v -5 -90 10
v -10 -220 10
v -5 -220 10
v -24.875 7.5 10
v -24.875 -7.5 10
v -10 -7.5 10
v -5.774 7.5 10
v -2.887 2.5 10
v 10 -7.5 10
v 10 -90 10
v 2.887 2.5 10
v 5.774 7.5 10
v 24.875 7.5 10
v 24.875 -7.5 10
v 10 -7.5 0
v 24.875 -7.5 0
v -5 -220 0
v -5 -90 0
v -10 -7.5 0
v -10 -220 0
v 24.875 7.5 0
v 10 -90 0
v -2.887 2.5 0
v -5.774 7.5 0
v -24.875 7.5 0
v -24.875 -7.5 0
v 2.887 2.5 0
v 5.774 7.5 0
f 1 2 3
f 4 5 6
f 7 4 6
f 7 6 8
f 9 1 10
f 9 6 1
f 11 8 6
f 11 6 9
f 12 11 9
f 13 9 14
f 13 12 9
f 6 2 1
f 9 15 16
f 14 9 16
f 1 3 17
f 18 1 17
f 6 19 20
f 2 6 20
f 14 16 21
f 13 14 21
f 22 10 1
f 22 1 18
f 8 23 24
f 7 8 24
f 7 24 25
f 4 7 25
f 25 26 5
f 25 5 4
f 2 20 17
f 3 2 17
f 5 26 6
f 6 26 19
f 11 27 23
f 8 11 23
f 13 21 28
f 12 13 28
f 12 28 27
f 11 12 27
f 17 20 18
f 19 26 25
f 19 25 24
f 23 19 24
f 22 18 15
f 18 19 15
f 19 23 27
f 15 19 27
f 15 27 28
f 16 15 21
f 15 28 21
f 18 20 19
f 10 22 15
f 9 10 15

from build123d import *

# Parameters (mm, degrees)
SKETCH1_W             = 20
SKETCH1_H             = 197.5
SKETCH1_H_2           = 15
SKETCH1_W_2           = 14.875
BOSS_EXTRUDE1_DEPTH   = 10
IZIM1_W               = 10
IZIM1_H               = 130
KES_EKSTR_ZYON1_DEPTH = 15


with BuildPart() as part:
    # Sketch1 → Boss-Extrude1 (new body)
    with BuildSketch(Plane.XY):
        with Locations((0, -121.25)):
            Rectangle(SKETCH1_W, SKETCH1_H)
        with Locations((0, -15)):
            Rectangle(SKETCH1_W, SKETCH1_H_2)
        Polygon((-10, 7.5), (-10, -7.5), (10, -7.5), (10, 7.5), (5.773502692, 7.5), (2.886751346, 2.5), (-2.886751346, 2.5), (-5.773502692, 7.5), align=None)
        with Locations((-17.4375, 0)):
            Rectangle(SKETCH1_W_2, SKETCH1_H_2)
        with Locations((17.4375, 0)):
            Rectangle(SKETCH1_W_2, SKETCH1_H_2)
    extrude(amount=BOSS_EXTRUDE1_DEPTH)

    # Çizim1 → Kes-Ekstrüzyon1 (cut)
    with BuildSketch(Plane(origin=(10, 0, 0), x_dir=(0, 0, -1), z_dir=(1, 0, 0))):
        with Locations((-5, -155)):
            Rectangle(IZIM1_W, IZIM1_H)
    extrude(amount=-KES_EKSTR_ZYON1_DEPTH, mode=Mode.SUBTRACT)


solid = part.part
